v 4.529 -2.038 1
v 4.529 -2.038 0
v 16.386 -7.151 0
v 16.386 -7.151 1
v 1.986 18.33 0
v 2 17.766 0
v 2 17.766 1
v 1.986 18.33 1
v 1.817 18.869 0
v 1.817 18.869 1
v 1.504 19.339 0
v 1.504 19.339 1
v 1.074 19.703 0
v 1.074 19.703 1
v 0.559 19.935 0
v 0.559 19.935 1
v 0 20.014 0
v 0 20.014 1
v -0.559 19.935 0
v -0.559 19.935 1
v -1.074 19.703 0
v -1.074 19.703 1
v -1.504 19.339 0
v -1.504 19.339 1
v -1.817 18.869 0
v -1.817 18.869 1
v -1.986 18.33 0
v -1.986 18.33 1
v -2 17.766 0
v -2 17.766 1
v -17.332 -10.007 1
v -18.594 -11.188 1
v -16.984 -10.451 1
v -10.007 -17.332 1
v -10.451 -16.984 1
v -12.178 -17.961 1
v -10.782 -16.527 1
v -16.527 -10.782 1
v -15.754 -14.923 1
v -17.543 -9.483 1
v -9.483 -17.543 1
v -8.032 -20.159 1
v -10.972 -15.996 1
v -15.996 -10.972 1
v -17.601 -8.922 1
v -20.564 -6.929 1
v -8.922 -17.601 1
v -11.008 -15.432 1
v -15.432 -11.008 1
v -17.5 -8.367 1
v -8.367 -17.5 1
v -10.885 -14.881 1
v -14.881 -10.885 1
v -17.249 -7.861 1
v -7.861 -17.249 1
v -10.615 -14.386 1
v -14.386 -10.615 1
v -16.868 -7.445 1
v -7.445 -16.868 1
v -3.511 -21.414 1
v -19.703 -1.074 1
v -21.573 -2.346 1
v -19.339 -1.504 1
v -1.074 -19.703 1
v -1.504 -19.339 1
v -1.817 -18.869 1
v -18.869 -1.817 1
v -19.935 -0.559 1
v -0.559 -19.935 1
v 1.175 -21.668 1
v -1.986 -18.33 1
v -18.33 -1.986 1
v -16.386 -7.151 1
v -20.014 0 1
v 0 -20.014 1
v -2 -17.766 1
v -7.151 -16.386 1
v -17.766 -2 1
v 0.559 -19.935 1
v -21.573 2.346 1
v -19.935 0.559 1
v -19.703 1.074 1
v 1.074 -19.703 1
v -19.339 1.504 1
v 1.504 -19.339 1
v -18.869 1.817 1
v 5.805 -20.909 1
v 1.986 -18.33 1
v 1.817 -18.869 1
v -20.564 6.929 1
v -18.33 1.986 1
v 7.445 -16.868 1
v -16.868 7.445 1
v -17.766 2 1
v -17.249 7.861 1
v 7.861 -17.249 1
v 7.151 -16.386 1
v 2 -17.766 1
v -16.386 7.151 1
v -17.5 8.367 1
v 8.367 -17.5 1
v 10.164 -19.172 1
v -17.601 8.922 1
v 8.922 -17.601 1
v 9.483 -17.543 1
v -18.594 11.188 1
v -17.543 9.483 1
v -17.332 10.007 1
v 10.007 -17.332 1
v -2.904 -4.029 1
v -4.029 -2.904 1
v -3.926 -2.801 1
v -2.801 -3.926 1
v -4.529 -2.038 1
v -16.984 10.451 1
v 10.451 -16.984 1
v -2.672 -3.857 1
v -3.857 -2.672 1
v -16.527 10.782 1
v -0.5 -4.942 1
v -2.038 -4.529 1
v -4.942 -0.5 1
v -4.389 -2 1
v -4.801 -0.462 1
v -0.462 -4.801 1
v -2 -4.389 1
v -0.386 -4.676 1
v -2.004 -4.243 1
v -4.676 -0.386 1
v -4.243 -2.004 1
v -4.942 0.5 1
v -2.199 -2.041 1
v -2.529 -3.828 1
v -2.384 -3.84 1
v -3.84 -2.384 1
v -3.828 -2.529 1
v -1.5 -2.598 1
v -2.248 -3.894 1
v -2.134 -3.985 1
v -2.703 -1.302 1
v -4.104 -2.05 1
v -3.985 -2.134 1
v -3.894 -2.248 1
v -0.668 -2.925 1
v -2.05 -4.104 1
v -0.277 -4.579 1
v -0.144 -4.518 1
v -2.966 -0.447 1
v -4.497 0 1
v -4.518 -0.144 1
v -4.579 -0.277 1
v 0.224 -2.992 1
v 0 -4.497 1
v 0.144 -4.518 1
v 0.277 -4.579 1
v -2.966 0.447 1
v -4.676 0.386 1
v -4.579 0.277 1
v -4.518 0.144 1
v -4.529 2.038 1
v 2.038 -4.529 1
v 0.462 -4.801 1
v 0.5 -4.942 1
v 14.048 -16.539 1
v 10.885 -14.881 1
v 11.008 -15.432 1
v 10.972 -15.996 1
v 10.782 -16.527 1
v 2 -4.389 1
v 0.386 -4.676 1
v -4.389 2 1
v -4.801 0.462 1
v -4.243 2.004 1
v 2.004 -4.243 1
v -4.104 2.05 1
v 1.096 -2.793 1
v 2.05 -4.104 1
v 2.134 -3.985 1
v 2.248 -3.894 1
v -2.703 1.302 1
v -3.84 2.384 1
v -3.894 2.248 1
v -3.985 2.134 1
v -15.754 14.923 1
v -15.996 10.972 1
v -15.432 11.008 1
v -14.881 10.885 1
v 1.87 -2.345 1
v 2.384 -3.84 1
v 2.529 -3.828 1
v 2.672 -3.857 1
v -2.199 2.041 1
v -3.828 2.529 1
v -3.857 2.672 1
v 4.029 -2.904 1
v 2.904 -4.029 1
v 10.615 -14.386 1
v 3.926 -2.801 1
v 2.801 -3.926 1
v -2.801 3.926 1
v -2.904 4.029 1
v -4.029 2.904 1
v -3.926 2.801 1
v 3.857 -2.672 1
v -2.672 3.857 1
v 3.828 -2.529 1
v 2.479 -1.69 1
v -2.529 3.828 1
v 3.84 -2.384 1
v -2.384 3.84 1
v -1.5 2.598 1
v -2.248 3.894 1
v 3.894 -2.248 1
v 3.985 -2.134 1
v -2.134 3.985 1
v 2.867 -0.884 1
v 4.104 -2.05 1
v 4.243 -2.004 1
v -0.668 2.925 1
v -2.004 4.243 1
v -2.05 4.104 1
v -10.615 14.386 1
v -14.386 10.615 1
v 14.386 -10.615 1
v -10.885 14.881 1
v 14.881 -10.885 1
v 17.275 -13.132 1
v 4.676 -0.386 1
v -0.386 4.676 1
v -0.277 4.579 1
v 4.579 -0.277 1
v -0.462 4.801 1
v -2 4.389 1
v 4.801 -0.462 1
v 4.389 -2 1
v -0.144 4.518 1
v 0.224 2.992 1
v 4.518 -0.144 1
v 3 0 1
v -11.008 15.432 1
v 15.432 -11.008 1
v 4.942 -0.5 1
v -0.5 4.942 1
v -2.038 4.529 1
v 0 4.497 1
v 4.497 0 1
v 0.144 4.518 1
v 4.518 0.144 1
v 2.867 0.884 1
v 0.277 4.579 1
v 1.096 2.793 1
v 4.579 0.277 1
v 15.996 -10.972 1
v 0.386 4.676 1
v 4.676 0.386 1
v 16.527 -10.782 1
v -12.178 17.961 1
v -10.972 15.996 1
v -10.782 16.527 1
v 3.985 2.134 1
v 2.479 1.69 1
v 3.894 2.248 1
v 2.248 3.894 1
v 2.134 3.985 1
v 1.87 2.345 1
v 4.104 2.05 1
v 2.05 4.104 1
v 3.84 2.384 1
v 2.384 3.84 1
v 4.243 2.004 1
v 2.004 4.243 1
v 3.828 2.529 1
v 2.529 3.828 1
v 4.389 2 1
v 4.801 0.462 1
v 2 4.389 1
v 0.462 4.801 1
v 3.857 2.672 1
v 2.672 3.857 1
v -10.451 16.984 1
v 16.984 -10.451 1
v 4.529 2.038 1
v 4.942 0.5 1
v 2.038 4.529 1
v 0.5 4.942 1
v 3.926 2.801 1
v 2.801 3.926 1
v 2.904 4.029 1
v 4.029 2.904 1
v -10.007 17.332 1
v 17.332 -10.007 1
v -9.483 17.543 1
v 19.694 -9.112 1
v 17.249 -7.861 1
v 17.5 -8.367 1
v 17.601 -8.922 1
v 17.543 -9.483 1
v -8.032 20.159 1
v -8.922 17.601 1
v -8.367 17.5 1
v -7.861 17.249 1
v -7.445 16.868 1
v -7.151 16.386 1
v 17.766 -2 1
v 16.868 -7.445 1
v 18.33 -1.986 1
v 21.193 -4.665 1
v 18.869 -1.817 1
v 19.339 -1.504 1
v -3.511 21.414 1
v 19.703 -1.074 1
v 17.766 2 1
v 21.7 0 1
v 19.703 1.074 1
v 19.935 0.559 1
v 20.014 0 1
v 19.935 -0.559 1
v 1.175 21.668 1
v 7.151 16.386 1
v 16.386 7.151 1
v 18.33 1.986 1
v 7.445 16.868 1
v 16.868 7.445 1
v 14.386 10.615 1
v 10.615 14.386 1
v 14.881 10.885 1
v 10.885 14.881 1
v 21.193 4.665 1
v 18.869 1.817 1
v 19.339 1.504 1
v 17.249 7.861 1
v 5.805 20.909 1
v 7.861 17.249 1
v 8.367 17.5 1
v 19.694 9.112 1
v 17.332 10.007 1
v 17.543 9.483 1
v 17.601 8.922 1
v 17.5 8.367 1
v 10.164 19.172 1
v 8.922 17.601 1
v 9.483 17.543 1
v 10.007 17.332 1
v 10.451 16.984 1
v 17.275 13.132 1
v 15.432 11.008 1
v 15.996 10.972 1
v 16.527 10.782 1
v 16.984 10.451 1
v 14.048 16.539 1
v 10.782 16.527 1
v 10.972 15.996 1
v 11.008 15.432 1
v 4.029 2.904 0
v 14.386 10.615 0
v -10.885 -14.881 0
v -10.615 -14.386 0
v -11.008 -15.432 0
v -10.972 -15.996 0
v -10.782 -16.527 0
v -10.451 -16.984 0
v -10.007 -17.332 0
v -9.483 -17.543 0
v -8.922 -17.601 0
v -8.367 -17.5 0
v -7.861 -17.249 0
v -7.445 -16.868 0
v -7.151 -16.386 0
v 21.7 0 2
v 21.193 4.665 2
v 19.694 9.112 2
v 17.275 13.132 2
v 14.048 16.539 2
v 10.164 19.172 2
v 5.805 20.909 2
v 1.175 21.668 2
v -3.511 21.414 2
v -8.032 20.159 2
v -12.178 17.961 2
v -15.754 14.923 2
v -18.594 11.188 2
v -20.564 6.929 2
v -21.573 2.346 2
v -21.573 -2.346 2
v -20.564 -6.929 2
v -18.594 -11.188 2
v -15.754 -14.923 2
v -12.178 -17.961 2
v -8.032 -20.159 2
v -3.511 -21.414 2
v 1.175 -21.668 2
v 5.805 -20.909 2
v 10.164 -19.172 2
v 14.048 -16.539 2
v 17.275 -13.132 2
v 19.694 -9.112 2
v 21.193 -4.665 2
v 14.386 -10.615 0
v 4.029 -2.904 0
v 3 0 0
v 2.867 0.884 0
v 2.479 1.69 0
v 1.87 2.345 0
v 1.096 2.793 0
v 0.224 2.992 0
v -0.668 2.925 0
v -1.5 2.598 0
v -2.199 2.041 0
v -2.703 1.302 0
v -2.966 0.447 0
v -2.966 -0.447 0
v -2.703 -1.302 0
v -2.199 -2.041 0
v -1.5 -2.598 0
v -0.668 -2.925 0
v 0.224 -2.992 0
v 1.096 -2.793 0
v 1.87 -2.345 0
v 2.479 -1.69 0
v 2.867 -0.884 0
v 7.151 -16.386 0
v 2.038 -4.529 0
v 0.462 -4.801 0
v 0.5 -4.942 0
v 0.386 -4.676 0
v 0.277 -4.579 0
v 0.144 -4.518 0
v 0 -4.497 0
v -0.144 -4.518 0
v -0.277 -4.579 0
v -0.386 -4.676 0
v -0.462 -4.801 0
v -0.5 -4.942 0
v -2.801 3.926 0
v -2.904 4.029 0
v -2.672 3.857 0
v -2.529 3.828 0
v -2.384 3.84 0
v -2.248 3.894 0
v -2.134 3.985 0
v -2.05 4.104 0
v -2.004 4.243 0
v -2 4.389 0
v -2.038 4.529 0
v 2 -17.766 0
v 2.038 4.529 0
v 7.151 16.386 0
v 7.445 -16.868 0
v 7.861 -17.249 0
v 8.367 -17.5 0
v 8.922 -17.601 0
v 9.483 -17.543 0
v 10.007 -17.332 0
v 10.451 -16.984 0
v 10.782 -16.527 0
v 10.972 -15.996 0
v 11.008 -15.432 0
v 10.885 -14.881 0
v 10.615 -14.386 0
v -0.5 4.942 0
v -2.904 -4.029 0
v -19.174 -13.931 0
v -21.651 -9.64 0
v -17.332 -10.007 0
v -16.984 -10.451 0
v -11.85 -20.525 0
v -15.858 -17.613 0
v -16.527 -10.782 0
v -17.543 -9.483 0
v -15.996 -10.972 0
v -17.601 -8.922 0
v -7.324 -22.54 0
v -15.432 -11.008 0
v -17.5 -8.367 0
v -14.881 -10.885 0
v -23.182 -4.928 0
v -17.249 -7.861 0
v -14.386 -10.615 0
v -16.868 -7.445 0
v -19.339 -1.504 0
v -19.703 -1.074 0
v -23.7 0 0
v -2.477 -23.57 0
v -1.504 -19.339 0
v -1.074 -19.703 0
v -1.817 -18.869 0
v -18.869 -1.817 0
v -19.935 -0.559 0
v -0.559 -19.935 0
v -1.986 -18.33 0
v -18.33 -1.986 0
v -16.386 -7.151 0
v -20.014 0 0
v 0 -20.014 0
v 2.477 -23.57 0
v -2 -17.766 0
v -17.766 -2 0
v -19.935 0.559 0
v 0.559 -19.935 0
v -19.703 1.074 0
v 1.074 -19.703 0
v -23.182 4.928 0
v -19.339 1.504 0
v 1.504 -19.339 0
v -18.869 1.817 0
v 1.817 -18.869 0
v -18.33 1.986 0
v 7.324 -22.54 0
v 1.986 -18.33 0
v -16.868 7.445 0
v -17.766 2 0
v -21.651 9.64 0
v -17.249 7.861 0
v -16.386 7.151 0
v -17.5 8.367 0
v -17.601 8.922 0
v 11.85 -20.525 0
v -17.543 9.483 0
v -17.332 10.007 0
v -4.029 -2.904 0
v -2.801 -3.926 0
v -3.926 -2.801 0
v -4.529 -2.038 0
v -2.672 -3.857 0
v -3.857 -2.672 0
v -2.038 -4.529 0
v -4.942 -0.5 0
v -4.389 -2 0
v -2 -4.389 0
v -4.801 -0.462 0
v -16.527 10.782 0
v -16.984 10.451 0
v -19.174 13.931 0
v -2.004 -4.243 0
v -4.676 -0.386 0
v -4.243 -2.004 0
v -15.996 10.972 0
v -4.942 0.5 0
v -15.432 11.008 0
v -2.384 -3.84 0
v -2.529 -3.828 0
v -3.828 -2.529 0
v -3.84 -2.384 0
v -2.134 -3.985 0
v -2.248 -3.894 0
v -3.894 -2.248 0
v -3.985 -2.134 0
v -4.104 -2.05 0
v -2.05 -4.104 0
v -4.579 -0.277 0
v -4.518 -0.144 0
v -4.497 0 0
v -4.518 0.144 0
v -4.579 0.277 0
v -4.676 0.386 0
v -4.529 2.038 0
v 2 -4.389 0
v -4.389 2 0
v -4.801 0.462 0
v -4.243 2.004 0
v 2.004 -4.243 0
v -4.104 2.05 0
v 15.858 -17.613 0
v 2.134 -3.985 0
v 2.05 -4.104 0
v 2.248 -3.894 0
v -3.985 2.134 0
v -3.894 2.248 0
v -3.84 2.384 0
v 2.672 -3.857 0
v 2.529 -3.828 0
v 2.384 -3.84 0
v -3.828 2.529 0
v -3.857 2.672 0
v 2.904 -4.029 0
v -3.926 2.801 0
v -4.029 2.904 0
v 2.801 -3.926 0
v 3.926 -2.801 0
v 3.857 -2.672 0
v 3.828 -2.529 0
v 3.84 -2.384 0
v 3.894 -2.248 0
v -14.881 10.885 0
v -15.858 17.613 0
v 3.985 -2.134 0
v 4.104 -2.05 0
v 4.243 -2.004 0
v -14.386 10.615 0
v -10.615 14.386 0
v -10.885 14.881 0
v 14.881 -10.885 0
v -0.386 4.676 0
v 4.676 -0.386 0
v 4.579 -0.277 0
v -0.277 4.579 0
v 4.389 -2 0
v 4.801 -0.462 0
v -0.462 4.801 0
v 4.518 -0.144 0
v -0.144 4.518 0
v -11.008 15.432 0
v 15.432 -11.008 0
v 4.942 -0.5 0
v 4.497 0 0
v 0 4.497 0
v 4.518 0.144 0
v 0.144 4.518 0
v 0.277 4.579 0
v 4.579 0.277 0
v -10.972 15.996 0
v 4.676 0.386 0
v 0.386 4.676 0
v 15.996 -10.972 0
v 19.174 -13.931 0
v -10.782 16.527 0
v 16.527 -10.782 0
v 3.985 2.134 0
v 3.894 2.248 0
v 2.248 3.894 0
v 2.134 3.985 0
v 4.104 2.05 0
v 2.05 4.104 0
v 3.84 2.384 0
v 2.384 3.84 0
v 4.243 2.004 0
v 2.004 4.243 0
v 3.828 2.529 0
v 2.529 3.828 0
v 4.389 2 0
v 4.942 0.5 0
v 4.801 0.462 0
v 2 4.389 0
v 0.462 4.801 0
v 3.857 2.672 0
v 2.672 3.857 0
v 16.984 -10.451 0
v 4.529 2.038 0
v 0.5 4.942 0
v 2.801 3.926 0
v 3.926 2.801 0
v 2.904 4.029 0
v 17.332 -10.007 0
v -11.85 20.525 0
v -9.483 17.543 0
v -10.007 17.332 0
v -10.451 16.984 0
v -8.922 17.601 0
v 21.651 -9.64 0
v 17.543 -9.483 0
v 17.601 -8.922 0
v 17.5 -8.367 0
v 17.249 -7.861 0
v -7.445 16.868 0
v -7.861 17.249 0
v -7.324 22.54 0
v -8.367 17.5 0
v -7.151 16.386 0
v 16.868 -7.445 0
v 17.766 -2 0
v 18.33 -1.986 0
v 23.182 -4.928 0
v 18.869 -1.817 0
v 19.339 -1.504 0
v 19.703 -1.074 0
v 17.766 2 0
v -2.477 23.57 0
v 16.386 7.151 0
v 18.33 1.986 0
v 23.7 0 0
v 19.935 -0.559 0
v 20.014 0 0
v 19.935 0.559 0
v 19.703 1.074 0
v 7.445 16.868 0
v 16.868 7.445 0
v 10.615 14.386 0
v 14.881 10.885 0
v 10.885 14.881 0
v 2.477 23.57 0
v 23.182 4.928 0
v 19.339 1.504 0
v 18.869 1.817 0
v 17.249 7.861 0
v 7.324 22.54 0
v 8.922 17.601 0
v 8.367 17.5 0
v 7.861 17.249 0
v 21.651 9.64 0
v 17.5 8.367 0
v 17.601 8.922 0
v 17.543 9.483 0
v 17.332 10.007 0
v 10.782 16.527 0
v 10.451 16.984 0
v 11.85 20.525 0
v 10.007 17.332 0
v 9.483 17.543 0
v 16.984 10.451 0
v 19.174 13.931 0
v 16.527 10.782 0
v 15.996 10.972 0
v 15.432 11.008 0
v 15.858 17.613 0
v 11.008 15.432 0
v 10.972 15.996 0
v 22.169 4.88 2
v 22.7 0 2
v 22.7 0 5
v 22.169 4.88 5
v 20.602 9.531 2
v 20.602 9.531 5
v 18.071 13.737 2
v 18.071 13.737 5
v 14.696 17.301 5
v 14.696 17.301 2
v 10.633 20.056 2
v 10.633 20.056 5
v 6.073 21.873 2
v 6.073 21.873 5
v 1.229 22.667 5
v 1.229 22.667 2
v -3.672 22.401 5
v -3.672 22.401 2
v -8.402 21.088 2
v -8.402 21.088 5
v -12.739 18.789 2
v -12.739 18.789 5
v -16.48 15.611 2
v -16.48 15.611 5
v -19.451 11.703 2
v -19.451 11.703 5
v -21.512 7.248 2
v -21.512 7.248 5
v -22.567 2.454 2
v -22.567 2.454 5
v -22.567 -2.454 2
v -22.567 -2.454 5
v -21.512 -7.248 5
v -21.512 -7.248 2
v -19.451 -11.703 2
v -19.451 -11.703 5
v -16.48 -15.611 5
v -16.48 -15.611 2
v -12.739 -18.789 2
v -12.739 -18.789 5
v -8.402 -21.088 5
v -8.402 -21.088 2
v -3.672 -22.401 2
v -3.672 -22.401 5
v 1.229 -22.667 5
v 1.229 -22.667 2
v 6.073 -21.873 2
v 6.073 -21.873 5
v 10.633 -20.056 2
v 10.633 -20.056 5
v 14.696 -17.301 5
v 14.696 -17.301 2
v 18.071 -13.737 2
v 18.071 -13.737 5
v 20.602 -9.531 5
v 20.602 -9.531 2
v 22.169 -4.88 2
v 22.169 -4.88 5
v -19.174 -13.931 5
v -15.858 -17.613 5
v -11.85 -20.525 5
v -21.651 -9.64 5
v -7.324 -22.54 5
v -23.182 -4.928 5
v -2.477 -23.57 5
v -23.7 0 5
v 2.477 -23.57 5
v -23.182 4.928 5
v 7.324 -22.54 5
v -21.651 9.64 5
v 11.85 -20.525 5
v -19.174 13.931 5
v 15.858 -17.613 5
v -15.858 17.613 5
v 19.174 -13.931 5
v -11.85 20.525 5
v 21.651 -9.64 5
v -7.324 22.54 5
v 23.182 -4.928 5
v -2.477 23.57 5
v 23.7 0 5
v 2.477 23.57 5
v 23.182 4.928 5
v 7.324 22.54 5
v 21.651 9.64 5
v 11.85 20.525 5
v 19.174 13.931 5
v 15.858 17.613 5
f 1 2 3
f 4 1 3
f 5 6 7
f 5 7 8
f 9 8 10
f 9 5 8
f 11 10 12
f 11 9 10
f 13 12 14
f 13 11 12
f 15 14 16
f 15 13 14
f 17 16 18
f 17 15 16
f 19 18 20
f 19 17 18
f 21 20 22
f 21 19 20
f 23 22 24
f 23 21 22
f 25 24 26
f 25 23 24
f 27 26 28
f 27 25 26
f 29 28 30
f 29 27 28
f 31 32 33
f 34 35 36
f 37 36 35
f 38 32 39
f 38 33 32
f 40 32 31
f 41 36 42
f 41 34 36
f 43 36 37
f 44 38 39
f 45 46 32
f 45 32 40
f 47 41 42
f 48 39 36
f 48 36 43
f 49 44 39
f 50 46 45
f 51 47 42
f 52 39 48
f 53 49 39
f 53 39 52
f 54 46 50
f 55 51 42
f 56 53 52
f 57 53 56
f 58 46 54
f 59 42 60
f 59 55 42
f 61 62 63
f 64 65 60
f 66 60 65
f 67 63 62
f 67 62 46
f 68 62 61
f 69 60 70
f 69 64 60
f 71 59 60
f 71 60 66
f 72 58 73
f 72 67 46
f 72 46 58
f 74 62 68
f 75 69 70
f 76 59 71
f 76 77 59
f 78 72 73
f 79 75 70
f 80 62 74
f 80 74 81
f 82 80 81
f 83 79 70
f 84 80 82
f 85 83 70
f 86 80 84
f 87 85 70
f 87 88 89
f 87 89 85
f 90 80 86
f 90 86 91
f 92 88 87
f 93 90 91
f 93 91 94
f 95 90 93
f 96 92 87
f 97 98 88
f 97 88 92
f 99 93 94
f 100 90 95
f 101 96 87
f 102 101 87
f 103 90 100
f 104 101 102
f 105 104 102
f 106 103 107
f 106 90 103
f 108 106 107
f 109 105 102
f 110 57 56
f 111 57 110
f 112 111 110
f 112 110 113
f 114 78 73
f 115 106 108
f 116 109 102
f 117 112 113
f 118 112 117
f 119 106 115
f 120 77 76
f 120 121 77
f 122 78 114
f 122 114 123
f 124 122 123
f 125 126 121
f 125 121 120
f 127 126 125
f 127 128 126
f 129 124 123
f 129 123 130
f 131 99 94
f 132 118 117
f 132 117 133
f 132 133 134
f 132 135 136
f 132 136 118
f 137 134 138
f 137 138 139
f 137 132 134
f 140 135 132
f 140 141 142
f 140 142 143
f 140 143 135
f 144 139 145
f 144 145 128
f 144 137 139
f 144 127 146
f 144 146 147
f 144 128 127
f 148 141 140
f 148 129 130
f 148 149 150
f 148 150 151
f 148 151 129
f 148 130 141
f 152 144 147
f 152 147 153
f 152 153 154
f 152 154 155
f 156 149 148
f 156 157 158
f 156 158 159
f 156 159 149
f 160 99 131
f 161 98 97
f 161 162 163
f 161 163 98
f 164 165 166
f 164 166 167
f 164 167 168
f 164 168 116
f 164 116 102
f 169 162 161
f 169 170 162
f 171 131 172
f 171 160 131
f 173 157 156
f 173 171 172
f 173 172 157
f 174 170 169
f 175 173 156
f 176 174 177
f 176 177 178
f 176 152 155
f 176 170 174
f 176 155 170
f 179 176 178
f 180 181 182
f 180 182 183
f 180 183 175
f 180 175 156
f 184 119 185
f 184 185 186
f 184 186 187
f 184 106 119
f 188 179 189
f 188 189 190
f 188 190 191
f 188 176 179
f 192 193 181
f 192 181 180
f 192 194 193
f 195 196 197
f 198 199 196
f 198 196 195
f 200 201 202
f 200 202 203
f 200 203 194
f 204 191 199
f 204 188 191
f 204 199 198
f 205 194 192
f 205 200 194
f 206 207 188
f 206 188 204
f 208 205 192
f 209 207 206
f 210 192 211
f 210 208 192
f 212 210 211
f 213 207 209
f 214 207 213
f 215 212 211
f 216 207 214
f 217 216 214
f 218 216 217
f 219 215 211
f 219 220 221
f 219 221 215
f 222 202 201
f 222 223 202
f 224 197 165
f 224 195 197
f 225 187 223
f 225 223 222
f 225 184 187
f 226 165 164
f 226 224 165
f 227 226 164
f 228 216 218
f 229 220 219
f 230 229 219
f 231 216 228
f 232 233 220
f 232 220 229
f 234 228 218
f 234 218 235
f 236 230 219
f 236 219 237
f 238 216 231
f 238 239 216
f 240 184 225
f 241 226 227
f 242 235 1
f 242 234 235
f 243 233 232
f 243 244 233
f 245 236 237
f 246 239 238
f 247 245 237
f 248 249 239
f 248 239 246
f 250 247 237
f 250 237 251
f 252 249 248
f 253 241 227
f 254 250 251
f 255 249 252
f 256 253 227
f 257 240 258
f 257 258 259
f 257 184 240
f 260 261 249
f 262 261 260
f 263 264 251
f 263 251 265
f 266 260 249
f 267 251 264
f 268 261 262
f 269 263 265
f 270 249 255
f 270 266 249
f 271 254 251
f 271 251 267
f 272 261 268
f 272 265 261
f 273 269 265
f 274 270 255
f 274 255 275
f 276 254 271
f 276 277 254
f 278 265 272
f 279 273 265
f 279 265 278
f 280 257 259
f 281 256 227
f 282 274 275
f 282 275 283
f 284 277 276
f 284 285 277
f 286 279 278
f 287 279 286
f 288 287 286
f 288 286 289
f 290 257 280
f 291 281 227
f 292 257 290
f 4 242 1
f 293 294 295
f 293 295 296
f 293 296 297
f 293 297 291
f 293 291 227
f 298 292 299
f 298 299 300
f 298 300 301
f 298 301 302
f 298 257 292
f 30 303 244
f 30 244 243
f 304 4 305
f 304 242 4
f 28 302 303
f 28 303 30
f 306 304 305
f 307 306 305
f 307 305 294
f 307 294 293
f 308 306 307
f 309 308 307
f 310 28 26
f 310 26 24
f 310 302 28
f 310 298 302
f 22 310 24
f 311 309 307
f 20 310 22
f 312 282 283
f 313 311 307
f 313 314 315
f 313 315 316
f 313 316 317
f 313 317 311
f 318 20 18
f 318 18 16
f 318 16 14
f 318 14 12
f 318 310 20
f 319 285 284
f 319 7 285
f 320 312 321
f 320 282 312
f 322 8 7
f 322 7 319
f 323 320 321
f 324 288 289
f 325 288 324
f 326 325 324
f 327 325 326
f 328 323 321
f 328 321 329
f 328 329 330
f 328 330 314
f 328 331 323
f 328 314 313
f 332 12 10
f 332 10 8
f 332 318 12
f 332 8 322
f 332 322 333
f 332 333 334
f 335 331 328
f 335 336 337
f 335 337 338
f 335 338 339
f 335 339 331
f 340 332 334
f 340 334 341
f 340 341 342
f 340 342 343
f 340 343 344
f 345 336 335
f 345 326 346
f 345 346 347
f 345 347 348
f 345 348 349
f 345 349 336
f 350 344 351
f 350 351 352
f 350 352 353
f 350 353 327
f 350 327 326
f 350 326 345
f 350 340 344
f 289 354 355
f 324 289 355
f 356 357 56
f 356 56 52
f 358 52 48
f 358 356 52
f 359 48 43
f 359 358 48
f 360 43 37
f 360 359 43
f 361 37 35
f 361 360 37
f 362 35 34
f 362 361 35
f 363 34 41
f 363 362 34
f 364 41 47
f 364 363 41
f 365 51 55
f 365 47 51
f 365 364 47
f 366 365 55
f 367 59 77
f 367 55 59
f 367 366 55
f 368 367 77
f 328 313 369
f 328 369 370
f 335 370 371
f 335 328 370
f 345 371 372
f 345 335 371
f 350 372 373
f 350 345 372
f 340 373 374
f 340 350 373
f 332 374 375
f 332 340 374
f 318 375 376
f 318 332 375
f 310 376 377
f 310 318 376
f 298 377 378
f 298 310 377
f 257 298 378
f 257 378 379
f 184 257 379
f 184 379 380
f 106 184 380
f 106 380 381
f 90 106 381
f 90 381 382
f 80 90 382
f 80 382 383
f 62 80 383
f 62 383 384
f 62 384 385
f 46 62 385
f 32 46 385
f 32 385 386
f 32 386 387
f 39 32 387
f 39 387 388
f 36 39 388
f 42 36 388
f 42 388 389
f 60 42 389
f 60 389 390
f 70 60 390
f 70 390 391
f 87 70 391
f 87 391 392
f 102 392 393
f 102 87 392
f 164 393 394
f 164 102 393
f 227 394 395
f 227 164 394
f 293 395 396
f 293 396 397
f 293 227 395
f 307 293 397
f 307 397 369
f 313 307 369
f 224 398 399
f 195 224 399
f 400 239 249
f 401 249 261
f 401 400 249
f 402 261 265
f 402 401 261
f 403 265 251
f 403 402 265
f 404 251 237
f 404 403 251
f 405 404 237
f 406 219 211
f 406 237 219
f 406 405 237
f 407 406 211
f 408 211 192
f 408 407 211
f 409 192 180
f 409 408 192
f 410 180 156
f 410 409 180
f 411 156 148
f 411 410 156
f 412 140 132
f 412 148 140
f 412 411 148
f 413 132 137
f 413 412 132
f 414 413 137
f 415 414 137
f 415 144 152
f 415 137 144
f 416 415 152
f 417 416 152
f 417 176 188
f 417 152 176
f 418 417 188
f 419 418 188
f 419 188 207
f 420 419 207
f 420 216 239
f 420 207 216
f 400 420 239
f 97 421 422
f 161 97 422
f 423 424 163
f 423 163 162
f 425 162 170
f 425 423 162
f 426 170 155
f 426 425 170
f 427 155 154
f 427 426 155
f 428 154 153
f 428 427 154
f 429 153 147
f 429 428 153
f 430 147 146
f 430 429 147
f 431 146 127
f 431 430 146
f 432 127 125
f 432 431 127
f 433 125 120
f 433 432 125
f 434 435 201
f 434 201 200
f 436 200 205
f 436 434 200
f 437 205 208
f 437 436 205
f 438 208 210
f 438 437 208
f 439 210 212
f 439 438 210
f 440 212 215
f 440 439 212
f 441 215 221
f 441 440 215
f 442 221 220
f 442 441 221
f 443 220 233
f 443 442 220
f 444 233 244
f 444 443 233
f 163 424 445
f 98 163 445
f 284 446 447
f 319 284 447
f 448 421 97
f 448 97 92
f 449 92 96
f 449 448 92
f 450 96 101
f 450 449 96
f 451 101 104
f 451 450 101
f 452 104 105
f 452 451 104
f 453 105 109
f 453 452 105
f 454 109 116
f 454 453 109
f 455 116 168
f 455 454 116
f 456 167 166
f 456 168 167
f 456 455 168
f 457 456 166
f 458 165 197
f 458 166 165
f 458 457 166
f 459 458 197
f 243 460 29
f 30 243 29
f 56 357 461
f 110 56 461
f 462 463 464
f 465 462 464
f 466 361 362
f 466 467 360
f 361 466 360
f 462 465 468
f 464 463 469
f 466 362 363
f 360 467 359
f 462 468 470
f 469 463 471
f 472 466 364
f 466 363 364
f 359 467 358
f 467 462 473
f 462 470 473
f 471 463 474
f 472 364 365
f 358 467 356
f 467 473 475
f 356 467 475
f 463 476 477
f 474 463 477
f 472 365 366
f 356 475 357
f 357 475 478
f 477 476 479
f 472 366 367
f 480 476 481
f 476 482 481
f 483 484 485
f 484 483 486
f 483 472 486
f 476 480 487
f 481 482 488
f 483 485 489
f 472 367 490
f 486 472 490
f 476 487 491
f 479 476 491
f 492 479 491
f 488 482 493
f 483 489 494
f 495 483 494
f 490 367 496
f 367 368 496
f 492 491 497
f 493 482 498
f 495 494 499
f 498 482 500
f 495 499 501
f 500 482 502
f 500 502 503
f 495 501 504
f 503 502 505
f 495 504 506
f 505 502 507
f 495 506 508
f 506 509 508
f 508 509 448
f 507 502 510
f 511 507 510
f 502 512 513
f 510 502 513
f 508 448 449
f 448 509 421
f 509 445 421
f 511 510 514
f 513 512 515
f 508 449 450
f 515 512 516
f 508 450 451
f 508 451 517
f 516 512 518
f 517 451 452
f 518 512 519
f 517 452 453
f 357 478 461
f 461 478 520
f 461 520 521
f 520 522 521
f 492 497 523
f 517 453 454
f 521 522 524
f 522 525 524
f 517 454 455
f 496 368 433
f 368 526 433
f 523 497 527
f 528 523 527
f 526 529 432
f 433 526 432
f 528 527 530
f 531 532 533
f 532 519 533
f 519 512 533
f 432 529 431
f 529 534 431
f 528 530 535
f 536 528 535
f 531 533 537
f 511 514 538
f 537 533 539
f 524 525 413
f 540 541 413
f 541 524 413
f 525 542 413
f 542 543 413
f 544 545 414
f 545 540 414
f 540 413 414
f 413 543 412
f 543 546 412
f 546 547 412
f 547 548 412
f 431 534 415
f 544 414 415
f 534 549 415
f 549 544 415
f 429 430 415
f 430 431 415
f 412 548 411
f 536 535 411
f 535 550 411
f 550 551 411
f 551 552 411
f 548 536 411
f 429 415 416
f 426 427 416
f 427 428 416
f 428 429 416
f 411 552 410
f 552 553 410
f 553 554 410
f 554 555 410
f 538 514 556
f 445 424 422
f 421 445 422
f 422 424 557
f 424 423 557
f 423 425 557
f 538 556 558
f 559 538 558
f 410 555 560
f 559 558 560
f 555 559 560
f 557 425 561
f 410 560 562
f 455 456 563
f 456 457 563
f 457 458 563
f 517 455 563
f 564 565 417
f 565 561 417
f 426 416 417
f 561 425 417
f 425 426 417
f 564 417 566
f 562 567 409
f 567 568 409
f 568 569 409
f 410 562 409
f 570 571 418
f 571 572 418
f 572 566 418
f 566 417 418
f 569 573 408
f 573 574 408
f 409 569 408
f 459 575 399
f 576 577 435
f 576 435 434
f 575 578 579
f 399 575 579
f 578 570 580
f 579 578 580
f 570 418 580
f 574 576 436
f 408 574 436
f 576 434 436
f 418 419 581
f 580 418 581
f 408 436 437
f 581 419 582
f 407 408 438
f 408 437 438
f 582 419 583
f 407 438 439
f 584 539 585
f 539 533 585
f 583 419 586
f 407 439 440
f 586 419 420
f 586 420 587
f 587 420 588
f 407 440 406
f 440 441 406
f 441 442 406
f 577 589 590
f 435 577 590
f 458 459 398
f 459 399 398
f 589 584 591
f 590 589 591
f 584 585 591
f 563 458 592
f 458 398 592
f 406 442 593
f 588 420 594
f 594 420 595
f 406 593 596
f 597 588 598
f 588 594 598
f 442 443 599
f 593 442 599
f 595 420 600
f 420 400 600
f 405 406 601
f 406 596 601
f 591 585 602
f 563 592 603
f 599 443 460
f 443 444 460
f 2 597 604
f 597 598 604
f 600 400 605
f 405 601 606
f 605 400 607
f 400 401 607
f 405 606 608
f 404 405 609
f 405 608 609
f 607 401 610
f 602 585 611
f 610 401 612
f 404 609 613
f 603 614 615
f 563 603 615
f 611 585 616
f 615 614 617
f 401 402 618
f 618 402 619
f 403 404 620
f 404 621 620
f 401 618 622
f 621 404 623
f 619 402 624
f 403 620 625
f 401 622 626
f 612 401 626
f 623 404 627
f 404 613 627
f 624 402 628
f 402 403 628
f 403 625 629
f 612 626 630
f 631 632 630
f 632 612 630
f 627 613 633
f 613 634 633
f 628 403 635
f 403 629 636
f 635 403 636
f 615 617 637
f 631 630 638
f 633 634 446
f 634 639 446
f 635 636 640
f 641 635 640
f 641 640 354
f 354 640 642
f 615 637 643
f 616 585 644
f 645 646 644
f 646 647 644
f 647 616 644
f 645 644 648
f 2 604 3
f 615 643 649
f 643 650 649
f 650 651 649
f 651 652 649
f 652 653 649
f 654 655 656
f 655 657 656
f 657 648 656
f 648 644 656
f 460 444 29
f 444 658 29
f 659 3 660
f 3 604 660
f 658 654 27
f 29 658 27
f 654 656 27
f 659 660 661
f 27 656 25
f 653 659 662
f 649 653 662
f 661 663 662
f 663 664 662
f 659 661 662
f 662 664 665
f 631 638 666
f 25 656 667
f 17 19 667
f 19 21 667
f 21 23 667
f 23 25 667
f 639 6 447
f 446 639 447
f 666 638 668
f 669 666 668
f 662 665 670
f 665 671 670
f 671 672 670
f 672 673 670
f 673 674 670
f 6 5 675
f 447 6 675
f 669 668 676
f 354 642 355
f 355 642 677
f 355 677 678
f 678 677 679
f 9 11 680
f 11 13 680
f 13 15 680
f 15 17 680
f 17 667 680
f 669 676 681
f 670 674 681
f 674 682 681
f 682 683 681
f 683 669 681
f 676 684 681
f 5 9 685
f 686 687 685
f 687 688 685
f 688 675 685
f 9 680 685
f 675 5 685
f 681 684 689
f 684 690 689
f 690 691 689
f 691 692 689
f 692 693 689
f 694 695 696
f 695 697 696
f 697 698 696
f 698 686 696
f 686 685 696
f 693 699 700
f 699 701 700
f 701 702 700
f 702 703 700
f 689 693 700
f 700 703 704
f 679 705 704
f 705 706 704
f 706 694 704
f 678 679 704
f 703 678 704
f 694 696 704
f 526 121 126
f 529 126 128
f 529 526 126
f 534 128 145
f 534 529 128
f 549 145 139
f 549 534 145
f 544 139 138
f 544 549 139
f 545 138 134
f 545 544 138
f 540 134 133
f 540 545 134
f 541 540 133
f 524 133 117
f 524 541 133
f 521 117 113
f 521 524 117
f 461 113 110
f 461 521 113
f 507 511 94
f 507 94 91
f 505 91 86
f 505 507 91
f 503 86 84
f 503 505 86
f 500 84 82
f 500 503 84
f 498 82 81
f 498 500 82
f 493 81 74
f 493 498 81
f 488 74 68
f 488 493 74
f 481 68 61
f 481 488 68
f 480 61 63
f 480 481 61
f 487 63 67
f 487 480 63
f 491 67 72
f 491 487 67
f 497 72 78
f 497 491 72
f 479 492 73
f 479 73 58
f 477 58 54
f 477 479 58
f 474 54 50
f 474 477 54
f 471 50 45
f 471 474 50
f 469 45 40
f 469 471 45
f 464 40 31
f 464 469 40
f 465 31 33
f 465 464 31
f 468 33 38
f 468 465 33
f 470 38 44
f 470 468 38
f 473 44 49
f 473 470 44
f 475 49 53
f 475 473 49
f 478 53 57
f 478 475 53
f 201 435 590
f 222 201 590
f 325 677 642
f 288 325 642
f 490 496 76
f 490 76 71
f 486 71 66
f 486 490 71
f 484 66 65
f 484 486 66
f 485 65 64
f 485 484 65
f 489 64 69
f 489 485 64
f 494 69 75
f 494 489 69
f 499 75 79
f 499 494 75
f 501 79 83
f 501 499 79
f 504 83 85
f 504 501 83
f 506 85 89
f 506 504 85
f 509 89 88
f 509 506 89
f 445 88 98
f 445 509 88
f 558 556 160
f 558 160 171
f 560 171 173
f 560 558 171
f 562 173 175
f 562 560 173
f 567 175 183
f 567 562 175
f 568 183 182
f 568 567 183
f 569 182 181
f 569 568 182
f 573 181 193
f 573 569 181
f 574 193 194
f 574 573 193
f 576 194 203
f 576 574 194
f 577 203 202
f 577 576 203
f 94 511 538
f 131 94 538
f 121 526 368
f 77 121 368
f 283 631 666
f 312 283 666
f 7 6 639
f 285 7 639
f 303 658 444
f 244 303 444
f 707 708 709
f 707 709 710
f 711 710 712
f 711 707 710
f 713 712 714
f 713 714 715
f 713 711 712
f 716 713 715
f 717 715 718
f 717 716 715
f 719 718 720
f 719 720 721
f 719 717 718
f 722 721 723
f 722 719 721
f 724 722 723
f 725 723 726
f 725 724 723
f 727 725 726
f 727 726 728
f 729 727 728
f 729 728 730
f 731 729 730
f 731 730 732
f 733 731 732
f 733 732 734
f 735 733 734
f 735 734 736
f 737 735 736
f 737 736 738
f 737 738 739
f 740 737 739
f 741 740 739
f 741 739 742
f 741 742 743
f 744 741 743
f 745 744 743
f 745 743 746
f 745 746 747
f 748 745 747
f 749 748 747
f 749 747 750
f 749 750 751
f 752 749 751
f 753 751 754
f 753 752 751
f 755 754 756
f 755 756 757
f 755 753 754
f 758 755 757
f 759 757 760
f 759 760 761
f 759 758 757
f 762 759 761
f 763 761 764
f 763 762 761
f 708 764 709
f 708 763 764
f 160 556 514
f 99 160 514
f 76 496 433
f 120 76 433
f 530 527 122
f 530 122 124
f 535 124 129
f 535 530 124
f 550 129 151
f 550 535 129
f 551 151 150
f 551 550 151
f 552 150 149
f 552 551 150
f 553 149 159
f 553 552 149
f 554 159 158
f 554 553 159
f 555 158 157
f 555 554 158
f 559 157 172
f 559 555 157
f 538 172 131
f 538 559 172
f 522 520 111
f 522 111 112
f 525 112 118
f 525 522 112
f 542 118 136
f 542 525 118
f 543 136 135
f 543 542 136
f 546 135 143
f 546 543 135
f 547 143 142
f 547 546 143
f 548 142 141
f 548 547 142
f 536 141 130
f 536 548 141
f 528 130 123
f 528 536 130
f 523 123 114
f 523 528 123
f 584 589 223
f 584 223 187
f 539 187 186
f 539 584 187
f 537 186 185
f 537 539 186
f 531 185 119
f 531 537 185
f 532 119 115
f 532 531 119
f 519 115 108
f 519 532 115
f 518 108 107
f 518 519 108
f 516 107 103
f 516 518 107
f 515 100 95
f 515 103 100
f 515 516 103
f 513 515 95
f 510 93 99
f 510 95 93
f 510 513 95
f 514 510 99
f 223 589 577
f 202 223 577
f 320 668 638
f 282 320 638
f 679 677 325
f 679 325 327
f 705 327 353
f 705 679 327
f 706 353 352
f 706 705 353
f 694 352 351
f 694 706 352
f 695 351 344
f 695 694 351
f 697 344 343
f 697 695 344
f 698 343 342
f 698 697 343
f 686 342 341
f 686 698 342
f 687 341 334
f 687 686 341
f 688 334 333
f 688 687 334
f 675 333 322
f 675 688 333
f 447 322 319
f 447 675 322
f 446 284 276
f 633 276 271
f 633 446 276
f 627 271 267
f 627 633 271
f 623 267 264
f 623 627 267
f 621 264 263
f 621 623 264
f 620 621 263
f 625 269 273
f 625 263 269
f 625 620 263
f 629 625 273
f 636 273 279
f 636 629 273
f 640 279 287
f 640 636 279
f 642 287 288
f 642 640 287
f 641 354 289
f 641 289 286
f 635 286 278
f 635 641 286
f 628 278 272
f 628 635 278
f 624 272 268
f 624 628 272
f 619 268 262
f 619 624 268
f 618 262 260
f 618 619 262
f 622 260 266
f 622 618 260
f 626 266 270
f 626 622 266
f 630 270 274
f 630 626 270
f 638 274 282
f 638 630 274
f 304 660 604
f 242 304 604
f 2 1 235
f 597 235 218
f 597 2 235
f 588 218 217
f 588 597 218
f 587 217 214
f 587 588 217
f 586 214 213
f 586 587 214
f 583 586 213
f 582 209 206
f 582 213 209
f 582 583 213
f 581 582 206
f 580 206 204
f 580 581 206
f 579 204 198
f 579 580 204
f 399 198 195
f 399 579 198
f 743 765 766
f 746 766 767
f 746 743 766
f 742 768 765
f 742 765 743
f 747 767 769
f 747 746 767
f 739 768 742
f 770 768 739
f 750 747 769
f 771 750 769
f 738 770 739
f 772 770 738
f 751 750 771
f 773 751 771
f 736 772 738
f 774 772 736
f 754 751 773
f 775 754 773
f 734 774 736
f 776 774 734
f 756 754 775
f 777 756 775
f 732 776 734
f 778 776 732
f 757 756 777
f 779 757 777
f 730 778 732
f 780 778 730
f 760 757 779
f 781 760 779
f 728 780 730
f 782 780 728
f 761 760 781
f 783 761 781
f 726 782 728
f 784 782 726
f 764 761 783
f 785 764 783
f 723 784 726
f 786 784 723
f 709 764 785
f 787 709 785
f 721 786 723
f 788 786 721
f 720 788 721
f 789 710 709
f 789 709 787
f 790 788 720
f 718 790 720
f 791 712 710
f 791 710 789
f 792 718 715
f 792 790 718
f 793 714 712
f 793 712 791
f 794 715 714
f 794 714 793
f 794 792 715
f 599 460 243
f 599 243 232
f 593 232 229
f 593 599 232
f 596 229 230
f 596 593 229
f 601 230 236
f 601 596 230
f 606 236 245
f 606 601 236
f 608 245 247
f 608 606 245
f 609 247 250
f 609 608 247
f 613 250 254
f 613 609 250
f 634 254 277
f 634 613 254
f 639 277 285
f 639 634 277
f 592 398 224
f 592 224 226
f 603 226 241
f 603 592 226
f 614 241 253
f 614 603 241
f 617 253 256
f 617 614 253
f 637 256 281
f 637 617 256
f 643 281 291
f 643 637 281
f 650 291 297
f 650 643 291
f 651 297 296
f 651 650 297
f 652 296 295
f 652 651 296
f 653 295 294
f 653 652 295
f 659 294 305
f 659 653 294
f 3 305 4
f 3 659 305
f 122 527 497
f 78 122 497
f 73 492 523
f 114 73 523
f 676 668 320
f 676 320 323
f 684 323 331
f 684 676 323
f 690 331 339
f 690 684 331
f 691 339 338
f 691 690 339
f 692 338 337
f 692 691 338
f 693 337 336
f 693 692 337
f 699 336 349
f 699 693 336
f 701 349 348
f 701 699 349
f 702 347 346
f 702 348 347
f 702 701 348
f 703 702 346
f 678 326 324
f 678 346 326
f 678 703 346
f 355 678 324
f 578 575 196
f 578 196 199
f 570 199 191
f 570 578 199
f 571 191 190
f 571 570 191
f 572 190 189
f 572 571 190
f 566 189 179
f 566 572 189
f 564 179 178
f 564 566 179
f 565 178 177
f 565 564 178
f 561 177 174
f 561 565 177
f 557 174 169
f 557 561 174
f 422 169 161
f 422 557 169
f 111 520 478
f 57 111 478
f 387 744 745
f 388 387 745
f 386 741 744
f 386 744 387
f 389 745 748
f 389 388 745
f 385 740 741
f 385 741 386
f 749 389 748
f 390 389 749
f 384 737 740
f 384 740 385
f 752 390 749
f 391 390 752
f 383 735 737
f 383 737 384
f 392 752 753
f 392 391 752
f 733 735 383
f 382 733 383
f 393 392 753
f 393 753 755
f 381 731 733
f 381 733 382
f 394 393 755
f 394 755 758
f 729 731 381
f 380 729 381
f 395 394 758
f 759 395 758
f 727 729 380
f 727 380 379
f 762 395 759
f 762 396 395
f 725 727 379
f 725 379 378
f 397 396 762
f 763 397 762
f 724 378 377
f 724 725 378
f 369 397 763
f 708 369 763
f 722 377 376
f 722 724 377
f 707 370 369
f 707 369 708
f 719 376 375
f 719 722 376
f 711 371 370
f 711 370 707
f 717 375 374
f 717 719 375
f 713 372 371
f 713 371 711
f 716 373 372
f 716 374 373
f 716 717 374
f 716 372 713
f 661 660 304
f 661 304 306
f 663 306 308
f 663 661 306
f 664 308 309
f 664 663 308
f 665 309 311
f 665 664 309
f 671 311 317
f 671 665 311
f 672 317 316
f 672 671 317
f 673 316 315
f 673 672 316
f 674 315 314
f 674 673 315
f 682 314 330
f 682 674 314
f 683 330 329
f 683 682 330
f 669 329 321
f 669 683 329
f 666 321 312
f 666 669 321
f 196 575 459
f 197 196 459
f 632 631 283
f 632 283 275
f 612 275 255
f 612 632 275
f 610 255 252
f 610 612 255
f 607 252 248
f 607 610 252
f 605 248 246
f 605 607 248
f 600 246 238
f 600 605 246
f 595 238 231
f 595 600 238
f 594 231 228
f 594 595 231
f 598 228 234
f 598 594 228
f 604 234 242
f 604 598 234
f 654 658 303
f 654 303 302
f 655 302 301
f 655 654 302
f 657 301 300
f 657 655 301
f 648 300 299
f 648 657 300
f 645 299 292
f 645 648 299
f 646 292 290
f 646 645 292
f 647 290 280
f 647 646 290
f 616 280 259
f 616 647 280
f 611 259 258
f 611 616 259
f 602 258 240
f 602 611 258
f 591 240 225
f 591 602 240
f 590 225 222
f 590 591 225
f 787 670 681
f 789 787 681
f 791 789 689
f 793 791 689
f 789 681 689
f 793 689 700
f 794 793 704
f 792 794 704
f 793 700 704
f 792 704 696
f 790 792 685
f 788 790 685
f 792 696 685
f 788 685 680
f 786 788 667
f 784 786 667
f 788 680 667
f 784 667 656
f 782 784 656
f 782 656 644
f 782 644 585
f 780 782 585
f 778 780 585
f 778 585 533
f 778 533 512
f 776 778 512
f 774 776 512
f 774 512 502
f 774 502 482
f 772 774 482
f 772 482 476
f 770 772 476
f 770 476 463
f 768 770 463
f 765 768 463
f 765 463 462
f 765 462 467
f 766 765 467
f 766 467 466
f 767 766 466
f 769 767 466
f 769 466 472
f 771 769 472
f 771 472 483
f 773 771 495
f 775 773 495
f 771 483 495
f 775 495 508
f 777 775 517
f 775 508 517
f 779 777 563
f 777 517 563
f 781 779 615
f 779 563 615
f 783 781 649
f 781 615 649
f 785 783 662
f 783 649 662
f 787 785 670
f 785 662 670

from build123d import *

# Parameters (mm, degrees)
SKETCH_R           = 23.7
PAD_DEPTH          = 1
POCKET_DEPTH       = 135.083363
POLARPATTERN_COUNT = 12
SKETCH002_R        = 23.7
SKETCH002_R_2      = 22.7
PAD001_DEPTH       = 5
SKETCH003_R        = 22.7
SKETCH003_R_2      = 21.7
PAD002_DEPTH       = 2
SKETCH004_R        = 3
POCKET001_DEPTH    = 5.001


with BuildPart() as part:
    # Sketch → Pad (new body)
    with BuildSketch(Plane.XY):
        Circle(SKETCH_R)
    extrude(amount=PAD_DEPTH)

    # Sketch001 → Pocket (cut, through all)
    with BuildSketch(Plane.XY):
        with BuildLine():
            ThreePointArc((-0.5, 4.941518), (0, 4.496592), (0.5, 4.941518))
            Line((2.000001, 17.766074), (0.5, 4.941518))
            ThreePointArc((2.000001, 17.766074), (-7e-06, 20.013635), (-1.999999, 17.766059))
            Line((-0.5, 4.941518), (-1.999999, 17.766059))
        make_face()
    pocket = extrude(amount=POCKET_DEPTH, mode=Mode.SUBTRACT)

    # PolarPattern: Pocket ×12 about axis
    polarpattern_axis = Axis((0, 0, 0), (0, 0, 1))
    for i in range(1, POLARPATTERN_COUNT):
        add(pocket.rotate(polarpattern_axis, i * 360 / POLARPATTERN_COUNT), mode=Mode.SUBTRACT)

    # Sketch002 → Pad001 (join)
    with BuildSketch(Plane.XY):
        Circle(SKETCH002_R)
        Circle(SKETCH002_R_2, mode=Mode.SUBTRACT)
    extrude(amount=PAD001_DEPTH)

    # Sketch003 → Pad002 (join)
    with BuildSketch(Plane.XY):
        Circle(SKETCH003_R)
        Circle(SKETCH003_R_2, mode=Mode.SUBTRACT)
    extrude(amount=PAD002_DEPTH)

    # Sketch004 → Pocket001 (cut, through all)
    with BuildSketch(Plane.XY):
        Circle(SKETCH004_R)
    extrude(amount=POCKET001_DEPTH, mode=Mode.SUBTRACT)


solid = part.part
